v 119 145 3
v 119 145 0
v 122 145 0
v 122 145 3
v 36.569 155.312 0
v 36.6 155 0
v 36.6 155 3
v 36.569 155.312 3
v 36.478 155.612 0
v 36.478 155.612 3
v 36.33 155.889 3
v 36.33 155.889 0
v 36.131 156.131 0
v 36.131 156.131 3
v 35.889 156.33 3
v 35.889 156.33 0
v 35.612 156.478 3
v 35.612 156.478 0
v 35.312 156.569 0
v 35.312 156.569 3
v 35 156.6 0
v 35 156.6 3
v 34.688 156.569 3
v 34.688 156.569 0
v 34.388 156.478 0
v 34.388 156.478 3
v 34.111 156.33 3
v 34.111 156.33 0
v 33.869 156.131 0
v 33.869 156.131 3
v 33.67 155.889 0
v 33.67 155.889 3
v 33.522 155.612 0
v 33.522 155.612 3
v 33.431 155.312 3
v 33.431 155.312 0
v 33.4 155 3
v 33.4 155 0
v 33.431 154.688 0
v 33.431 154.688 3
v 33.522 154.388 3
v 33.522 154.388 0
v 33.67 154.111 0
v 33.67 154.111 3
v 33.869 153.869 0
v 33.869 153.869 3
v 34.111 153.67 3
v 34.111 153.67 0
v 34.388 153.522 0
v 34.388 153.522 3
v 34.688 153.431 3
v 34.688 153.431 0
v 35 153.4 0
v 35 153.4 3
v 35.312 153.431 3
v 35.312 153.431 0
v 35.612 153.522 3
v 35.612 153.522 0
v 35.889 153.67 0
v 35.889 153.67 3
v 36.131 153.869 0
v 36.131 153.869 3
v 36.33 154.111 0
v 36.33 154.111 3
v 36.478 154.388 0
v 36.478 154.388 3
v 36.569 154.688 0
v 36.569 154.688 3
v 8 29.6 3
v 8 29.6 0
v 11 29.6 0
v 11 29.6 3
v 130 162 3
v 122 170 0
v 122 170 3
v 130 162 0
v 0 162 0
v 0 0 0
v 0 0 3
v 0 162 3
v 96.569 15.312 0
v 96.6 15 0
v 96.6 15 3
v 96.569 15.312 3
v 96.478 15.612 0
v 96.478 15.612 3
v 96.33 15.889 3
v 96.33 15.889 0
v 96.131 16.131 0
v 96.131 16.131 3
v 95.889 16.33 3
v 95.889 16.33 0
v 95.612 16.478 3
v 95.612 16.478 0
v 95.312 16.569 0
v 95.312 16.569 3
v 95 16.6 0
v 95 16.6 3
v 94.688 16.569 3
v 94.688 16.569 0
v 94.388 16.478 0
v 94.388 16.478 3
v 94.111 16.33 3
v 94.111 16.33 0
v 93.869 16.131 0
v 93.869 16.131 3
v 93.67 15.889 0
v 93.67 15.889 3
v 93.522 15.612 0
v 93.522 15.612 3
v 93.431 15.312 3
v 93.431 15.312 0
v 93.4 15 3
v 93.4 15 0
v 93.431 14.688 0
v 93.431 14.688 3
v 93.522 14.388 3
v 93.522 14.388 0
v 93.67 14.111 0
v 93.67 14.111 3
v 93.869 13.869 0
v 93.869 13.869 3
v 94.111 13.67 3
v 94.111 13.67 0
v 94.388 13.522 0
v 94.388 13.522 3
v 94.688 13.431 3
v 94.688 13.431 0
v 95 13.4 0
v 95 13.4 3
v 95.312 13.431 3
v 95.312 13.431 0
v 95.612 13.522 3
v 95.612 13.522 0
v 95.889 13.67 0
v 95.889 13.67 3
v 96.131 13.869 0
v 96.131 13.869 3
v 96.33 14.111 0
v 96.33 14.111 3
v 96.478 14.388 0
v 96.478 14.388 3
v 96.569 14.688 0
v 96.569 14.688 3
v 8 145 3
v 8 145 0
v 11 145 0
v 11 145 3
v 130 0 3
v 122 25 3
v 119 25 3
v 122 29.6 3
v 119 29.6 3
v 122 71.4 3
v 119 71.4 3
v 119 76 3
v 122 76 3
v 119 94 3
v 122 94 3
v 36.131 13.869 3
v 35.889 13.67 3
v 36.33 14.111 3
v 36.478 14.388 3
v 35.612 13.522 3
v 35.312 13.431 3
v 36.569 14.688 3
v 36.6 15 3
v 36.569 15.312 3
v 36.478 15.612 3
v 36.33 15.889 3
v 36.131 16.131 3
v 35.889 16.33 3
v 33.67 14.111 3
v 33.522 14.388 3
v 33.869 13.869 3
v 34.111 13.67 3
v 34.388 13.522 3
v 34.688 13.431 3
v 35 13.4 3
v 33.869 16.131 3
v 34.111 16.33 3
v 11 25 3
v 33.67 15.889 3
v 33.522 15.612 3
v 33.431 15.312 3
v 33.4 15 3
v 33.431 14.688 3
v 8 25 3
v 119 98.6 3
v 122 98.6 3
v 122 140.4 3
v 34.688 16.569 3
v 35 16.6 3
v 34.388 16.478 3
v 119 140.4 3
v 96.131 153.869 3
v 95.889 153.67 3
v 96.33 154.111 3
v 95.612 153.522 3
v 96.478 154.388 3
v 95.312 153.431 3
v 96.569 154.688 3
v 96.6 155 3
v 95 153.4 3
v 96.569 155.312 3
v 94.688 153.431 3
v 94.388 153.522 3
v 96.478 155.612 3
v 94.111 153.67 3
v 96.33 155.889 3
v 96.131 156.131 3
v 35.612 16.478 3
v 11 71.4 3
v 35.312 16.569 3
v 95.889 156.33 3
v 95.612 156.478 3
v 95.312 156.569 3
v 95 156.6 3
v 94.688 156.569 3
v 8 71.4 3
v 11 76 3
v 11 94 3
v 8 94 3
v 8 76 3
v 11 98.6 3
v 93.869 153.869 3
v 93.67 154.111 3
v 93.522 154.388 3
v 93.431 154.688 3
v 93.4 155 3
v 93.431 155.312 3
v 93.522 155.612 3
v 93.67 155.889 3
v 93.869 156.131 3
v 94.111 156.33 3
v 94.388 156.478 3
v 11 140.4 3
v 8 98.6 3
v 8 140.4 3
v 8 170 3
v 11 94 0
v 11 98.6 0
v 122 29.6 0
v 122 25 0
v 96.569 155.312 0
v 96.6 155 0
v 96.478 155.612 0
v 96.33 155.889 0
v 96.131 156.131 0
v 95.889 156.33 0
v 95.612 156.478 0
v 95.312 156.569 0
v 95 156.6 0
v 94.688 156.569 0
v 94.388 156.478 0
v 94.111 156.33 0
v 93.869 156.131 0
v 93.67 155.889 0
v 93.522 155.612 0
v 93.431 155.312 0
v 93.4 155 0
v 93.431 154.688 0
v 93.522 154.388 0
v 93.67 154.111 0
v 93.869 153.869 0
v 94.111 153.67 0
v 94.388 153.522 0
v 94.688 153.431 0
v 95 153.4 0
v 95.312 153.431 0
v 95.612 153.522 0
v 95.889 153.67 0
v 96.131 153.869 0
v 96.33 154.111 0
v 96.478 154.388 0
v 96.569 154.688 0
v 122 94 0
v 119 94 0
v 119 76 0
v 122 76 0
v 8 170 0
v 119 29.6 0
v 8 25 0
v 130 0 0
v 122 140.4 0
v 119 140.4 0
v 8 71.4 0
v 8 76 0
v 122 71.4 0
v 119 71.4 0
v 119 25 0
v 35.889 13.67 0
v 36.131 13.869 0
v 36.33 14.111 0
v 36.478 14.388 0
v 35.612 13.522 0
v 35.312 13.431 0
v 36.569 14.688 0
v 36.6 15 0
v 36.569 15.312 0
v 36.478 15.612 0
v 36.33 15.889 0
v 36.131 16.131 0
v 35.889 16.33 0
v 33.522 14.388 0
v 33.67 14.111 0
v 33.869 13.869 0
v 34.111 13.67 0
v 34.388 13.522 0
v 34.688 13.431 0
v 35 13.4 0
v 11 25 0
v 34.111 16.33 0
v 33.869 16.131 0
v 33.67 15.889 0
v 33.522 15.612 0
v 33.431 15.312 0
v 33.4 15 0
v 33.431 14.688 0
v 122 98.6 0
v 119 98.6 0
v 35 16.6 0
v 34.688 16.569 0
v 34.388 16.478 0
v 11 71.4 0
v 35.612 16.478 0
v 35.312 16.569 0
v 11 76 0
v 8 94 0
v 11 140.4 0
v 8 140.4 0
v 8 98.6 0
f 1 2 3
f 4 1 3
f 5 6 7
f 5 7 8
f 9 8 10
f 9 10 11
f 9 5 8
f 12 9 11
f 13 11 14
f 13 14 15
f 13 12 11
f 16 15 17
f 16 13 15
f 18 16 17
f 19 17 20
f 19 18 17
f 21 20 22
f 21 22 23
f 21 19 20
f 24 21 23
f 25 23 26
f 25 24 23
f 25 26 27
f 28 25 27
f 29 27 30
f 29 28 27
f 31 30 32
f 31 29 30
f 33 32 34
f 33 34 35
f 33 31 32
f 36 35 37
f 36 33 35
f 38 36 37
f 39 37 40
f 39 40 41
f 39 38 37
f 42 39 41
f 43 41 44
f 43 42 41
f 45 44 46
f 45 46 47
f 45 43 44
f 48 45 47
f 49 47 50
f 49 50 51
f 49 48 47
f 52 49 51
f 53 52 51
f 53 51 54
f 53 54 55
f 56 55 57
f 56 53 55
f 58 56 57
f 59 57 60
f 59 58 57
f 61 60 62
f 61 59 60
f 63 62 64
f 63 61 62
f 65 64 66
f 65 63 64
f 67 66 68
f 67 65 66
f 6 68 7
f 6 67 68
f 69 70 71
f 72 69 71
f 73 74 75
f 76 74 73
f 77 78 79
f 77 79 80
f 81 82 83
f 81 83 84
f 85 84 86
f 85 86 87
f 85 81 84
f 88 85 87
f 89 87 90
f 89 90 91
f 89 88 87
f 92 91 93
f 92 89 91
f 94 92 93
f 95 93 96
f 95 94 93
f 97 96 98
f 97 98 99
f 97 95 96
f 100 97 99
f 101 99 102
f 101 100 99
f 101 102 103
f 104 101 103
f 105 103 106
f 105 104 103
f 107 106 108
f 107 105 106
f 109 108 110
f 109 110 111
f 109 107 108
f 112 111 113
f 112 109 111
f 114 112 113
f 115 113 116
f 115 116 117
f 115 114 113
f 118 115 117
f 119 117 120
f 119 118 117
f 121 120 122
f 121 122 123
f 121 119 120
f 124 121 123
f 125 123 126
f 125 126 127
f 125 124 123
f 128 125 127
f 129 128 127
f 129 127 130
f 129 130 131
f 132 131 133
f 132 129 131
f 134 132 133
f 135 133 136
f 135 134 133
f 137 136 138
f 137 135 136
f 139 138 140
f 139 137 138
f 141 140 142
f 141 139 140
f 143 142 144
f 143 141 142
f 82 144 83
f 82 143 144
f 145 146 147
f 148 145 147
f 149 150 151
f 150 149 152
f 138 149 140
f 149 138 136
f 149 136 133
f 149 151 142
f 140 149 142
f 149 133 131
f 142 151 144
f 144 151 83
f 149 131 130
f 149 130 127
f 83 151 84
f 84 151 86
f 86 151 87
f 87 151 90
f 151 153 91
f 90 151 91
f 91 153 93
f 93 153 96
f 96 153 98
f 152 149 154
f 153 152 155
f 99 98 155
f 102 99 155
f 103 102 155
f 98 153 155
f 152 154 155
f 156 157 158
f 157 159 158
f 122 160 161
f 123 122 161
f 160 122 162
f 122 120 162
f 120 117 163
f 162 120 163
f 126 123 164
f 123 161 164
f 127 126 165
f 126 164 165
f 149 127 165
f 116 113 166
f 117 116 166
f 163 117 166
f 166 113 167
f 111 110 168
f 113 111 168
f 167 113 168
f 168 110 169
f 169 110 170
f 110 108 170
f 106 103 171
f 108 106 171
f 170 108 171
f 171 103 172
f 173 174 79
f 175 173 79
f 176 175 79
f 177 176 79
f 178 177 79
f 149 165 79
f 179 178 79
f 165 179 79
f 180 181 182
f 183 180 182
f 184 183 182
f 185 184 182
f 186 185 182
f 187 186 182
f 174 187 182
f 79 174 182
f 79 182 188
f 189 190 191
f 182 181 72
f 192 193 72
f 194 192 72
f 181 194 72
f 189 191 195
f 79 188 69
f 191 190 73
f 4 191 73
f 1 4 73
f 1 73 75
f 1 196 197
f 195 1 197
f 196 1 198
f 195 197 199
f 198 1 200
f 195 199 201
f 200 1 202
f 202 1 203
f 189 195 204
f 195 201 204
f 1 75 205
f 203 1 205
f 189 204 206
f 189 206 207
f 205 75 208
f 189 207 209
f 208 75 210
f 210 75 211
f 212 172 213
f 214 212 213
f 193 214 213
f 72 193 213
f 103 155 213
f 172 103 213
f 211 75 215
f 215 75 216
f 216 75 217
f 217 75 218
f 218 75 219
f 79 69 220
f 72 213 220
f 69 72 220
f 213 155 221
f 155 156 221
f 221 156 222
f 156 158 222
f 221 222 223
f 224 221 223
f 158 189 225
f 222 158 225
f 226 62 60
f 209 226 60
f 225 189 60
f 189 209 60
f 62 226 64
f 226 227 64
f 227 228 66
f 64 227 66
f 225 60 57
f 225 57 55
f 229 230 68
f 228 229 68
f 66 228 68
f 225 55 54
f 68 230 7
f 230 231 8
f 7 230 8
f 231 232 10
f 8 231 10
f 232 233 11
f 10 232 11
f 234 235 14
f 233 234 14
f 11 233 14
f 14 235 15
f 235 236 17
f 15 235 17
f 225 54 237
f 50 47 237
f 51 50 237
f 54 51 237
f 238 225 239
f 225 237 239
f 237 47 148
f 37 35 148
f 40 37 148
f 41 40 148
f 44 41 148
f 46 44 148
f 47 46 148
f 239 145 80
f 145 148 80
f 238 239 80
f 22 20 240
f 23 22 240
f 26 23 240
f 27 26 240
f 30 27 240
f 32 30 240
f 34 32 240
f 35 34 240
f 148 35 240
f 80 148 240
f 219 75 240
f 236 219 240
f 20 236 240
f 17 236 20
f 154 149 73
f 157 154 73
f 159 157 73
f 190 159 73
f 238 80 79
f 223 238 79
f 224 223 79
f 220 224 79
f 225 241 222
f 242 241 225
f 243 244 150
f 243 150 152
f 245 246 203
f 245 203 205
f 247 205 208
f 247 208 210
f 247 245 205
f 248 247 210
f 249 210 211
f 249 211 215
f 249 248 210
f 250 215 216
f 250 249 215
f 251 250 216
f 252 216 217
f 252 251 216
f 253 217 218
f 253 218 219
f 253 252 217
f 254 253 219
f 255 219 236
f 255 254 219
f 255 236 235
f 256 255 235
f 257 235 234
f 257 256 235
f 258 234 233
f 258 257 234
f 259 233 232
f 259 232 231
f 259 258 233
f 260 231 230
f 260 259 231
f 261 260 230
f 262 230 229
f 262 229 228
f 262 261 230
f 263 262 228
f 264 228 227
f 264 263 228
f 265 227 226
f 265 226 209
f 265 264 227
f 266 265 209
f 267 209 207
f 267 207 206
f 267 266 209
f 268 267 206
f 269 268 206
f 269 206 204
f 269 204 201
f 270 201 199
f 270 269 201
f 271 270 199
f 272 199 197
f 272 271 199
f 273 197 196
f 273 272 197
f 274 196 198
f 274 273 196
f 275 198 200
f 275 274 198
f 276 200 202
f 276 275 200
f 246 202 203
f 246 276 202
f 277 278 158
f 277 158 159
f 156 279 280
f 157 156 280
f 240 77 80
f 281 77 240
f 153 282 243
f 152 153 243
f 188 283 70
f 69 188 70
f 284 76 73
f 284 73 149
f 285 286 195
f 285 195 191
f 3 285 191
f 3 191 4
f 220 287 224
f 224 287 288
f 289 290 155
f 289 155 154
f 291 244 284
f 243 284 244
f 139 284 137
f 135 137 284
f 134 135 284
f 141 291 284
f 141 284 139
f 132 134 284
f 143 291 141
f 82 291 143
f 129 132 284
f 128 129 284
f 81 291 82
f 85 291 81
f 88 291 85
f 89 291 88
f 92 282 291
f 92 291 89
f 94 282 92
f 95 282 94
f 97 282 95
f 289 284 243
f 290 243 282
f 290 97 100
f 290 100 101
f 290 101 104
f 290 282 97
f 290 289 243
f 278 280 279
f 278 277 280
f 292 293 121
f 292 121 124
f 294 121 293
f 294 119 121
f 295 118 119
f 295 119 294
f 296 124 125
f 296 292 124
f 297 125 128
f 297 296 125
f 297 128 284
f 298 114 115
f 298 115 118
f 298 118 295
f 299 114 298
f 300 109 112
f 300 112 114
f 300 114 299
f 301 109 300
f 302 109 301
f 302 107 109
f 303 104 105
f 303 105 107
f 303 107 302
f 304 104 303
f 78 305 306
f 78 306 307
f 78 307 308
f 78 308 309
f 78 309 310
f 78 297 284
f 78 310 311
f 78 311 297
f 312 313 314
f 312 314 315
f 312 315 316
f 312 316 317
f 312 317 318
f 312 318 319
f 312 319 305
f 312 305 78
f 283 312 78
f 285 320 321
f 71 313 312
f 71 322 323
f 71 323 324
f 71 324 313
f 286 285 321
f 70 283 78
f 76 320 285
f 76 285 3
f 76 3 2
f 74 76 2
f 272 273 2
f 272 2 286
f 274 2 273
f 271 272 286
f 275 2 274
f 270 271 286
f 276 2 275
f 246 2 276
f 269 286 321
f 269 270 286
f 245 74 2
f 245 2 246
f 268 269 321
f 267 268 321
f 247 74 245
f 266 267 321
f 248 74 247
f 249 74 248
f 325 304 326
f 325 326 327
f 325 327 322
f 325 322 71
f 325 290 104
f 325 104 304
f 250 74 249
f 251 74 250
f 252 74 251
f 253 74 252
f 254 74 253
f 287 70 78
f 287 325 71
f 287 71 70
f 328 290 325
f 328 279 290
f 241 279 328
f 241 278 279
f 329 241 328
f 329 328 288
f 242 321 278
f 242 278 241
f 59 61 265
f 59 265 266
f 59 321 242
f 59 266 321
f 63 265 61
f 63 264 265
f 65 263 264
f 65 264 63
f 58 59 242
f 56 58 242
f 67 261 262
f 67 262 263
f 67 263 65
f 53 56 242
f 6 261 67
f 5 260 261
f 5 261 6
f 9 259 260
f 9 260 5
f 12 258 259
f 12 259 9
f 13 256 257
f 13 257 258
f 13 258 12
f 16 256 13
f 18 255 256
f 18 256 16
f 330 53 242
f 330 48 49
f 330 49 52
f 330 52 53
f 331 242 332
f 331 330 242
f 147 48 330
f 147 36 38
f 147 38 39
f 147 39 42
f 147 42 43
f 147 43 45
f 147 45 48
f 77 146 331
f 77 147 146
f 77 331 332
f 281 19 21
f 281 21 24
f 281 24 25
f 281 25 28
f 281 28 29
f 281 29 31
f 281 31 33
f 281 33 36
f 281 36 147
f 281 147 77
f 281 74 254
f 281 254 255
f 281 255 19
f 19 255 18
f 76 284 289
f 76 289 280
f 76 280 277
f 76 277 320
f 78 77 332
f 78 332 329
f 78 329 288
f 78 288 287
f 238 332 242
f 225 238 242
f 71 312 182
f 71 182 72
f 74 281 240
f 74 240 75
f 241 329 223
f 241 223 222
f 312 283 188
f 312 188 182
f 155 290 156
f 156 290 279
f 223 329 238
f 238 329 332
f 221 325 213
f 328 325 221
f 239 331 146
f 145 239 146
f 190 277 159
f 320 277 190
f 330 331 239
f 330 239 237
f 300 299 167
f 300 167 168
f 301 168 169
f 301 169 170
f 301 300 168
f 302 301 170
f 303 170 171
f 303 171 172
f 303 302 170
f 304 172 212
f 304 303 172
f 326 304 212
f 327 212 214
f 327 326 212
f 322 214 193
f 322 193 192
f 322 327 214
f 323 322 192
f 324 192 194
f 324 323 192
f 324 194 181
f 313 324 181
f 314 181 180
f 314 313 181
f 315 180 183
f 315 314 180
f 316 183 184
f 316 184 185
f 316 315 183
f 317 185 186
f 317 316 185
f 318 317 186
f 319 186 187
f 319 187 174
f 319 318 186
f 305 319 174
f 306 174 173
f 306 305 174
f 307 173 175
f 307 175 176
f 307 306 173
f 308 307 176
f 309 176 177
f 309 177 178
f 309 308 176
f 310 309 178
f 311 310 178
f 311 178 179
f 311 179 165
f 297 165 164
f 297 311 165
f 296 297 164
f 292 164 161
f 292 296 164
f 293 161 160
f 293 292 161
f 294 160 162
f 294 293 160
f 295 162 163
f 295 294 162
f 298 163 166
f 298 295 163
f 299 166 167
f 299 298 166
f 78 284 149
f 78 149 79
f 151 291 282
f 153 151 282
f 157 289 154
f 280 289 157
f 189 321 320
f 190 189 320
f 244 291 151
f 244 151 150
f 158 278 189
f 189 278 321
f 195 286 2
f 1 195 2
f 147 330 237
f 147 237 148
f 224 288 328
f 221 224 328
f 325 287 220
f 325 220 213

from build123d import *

# Parameters (mm, degrees)
SKETCH_1_R      = 1.6
SKETCH_1_W      = 3
SKETCH_1_H      = 4.6
EXTRUDE_1_DEPTH = 3


with BuildPart() as part:
    # ｽｹｯﾁ1 → ﾎﾞｽ - 押し出し1 (new body)
    with BuildSketch(Plane.XY):
        Polygon((0, 162), (8, 170), (122, 170), (130, 162), (130, 0), (0, 0), align=None)
        with Locations((35, 155)):
            Circle(SKETCH_1_R, mode=Mode.SUBTRACT)
        with Locations((95, 155)):
            Circle(SKETCH_1_R, mode=Mode.SUBTRACT)
        with Locations((35, 15)):
            Circle(SKETCH_1_R, mode=Mode.SUBTRACT)
        with Locations((95, 15)):
            Circle(SKETCH_1_R, mode=Mode.SUBTRACT)
        with Locations((9.5, 142.7)):
            Rectangle(SKETCH_1_W, SKETCH_1_H, mode=Mode.SUBTRACT)
        with Locations((120.5, 142.7)):
            Rectangle(SKETCH_1_W, SKETCH_1_H, mode=Mode.SUBTRACT)
        with Locations((9.5, 27.3)):
            Rectangle(SKETCH_1_W, SKETCH_1_H, mode=Mode.SUBTRACT)
        with Locations((120.5, 27.3)):
            Rectangle(SKETCH_1_W, SKETCH_1_H, mode=Mode.SUBTRACT)
        with Locations((9.5, 96.3)):
            Rectangle(SKETCH_1_W, SKETCH_1_H, mode=Mode.SUBTRACT)
        with Locations((120.5, 96.3)):
            Rectangle(SKETCH_1_W, SKETCH_1_H, mode=Mode.SUBTRACT)
        with Locations((9.5, 73.7)):
            Rectangle(SKETCH_1_W, SKETCH_1_H, mode=Mode.SUBTRACT)
        with Locations((120.5, 73.7)):
            Rectangle(SKETCH_1_W, SKETCH_1_H, mode=Mode.SUBTRACT)
    extrude(amount=EXTRUDE_1_DEPTH)


solid = part.part
